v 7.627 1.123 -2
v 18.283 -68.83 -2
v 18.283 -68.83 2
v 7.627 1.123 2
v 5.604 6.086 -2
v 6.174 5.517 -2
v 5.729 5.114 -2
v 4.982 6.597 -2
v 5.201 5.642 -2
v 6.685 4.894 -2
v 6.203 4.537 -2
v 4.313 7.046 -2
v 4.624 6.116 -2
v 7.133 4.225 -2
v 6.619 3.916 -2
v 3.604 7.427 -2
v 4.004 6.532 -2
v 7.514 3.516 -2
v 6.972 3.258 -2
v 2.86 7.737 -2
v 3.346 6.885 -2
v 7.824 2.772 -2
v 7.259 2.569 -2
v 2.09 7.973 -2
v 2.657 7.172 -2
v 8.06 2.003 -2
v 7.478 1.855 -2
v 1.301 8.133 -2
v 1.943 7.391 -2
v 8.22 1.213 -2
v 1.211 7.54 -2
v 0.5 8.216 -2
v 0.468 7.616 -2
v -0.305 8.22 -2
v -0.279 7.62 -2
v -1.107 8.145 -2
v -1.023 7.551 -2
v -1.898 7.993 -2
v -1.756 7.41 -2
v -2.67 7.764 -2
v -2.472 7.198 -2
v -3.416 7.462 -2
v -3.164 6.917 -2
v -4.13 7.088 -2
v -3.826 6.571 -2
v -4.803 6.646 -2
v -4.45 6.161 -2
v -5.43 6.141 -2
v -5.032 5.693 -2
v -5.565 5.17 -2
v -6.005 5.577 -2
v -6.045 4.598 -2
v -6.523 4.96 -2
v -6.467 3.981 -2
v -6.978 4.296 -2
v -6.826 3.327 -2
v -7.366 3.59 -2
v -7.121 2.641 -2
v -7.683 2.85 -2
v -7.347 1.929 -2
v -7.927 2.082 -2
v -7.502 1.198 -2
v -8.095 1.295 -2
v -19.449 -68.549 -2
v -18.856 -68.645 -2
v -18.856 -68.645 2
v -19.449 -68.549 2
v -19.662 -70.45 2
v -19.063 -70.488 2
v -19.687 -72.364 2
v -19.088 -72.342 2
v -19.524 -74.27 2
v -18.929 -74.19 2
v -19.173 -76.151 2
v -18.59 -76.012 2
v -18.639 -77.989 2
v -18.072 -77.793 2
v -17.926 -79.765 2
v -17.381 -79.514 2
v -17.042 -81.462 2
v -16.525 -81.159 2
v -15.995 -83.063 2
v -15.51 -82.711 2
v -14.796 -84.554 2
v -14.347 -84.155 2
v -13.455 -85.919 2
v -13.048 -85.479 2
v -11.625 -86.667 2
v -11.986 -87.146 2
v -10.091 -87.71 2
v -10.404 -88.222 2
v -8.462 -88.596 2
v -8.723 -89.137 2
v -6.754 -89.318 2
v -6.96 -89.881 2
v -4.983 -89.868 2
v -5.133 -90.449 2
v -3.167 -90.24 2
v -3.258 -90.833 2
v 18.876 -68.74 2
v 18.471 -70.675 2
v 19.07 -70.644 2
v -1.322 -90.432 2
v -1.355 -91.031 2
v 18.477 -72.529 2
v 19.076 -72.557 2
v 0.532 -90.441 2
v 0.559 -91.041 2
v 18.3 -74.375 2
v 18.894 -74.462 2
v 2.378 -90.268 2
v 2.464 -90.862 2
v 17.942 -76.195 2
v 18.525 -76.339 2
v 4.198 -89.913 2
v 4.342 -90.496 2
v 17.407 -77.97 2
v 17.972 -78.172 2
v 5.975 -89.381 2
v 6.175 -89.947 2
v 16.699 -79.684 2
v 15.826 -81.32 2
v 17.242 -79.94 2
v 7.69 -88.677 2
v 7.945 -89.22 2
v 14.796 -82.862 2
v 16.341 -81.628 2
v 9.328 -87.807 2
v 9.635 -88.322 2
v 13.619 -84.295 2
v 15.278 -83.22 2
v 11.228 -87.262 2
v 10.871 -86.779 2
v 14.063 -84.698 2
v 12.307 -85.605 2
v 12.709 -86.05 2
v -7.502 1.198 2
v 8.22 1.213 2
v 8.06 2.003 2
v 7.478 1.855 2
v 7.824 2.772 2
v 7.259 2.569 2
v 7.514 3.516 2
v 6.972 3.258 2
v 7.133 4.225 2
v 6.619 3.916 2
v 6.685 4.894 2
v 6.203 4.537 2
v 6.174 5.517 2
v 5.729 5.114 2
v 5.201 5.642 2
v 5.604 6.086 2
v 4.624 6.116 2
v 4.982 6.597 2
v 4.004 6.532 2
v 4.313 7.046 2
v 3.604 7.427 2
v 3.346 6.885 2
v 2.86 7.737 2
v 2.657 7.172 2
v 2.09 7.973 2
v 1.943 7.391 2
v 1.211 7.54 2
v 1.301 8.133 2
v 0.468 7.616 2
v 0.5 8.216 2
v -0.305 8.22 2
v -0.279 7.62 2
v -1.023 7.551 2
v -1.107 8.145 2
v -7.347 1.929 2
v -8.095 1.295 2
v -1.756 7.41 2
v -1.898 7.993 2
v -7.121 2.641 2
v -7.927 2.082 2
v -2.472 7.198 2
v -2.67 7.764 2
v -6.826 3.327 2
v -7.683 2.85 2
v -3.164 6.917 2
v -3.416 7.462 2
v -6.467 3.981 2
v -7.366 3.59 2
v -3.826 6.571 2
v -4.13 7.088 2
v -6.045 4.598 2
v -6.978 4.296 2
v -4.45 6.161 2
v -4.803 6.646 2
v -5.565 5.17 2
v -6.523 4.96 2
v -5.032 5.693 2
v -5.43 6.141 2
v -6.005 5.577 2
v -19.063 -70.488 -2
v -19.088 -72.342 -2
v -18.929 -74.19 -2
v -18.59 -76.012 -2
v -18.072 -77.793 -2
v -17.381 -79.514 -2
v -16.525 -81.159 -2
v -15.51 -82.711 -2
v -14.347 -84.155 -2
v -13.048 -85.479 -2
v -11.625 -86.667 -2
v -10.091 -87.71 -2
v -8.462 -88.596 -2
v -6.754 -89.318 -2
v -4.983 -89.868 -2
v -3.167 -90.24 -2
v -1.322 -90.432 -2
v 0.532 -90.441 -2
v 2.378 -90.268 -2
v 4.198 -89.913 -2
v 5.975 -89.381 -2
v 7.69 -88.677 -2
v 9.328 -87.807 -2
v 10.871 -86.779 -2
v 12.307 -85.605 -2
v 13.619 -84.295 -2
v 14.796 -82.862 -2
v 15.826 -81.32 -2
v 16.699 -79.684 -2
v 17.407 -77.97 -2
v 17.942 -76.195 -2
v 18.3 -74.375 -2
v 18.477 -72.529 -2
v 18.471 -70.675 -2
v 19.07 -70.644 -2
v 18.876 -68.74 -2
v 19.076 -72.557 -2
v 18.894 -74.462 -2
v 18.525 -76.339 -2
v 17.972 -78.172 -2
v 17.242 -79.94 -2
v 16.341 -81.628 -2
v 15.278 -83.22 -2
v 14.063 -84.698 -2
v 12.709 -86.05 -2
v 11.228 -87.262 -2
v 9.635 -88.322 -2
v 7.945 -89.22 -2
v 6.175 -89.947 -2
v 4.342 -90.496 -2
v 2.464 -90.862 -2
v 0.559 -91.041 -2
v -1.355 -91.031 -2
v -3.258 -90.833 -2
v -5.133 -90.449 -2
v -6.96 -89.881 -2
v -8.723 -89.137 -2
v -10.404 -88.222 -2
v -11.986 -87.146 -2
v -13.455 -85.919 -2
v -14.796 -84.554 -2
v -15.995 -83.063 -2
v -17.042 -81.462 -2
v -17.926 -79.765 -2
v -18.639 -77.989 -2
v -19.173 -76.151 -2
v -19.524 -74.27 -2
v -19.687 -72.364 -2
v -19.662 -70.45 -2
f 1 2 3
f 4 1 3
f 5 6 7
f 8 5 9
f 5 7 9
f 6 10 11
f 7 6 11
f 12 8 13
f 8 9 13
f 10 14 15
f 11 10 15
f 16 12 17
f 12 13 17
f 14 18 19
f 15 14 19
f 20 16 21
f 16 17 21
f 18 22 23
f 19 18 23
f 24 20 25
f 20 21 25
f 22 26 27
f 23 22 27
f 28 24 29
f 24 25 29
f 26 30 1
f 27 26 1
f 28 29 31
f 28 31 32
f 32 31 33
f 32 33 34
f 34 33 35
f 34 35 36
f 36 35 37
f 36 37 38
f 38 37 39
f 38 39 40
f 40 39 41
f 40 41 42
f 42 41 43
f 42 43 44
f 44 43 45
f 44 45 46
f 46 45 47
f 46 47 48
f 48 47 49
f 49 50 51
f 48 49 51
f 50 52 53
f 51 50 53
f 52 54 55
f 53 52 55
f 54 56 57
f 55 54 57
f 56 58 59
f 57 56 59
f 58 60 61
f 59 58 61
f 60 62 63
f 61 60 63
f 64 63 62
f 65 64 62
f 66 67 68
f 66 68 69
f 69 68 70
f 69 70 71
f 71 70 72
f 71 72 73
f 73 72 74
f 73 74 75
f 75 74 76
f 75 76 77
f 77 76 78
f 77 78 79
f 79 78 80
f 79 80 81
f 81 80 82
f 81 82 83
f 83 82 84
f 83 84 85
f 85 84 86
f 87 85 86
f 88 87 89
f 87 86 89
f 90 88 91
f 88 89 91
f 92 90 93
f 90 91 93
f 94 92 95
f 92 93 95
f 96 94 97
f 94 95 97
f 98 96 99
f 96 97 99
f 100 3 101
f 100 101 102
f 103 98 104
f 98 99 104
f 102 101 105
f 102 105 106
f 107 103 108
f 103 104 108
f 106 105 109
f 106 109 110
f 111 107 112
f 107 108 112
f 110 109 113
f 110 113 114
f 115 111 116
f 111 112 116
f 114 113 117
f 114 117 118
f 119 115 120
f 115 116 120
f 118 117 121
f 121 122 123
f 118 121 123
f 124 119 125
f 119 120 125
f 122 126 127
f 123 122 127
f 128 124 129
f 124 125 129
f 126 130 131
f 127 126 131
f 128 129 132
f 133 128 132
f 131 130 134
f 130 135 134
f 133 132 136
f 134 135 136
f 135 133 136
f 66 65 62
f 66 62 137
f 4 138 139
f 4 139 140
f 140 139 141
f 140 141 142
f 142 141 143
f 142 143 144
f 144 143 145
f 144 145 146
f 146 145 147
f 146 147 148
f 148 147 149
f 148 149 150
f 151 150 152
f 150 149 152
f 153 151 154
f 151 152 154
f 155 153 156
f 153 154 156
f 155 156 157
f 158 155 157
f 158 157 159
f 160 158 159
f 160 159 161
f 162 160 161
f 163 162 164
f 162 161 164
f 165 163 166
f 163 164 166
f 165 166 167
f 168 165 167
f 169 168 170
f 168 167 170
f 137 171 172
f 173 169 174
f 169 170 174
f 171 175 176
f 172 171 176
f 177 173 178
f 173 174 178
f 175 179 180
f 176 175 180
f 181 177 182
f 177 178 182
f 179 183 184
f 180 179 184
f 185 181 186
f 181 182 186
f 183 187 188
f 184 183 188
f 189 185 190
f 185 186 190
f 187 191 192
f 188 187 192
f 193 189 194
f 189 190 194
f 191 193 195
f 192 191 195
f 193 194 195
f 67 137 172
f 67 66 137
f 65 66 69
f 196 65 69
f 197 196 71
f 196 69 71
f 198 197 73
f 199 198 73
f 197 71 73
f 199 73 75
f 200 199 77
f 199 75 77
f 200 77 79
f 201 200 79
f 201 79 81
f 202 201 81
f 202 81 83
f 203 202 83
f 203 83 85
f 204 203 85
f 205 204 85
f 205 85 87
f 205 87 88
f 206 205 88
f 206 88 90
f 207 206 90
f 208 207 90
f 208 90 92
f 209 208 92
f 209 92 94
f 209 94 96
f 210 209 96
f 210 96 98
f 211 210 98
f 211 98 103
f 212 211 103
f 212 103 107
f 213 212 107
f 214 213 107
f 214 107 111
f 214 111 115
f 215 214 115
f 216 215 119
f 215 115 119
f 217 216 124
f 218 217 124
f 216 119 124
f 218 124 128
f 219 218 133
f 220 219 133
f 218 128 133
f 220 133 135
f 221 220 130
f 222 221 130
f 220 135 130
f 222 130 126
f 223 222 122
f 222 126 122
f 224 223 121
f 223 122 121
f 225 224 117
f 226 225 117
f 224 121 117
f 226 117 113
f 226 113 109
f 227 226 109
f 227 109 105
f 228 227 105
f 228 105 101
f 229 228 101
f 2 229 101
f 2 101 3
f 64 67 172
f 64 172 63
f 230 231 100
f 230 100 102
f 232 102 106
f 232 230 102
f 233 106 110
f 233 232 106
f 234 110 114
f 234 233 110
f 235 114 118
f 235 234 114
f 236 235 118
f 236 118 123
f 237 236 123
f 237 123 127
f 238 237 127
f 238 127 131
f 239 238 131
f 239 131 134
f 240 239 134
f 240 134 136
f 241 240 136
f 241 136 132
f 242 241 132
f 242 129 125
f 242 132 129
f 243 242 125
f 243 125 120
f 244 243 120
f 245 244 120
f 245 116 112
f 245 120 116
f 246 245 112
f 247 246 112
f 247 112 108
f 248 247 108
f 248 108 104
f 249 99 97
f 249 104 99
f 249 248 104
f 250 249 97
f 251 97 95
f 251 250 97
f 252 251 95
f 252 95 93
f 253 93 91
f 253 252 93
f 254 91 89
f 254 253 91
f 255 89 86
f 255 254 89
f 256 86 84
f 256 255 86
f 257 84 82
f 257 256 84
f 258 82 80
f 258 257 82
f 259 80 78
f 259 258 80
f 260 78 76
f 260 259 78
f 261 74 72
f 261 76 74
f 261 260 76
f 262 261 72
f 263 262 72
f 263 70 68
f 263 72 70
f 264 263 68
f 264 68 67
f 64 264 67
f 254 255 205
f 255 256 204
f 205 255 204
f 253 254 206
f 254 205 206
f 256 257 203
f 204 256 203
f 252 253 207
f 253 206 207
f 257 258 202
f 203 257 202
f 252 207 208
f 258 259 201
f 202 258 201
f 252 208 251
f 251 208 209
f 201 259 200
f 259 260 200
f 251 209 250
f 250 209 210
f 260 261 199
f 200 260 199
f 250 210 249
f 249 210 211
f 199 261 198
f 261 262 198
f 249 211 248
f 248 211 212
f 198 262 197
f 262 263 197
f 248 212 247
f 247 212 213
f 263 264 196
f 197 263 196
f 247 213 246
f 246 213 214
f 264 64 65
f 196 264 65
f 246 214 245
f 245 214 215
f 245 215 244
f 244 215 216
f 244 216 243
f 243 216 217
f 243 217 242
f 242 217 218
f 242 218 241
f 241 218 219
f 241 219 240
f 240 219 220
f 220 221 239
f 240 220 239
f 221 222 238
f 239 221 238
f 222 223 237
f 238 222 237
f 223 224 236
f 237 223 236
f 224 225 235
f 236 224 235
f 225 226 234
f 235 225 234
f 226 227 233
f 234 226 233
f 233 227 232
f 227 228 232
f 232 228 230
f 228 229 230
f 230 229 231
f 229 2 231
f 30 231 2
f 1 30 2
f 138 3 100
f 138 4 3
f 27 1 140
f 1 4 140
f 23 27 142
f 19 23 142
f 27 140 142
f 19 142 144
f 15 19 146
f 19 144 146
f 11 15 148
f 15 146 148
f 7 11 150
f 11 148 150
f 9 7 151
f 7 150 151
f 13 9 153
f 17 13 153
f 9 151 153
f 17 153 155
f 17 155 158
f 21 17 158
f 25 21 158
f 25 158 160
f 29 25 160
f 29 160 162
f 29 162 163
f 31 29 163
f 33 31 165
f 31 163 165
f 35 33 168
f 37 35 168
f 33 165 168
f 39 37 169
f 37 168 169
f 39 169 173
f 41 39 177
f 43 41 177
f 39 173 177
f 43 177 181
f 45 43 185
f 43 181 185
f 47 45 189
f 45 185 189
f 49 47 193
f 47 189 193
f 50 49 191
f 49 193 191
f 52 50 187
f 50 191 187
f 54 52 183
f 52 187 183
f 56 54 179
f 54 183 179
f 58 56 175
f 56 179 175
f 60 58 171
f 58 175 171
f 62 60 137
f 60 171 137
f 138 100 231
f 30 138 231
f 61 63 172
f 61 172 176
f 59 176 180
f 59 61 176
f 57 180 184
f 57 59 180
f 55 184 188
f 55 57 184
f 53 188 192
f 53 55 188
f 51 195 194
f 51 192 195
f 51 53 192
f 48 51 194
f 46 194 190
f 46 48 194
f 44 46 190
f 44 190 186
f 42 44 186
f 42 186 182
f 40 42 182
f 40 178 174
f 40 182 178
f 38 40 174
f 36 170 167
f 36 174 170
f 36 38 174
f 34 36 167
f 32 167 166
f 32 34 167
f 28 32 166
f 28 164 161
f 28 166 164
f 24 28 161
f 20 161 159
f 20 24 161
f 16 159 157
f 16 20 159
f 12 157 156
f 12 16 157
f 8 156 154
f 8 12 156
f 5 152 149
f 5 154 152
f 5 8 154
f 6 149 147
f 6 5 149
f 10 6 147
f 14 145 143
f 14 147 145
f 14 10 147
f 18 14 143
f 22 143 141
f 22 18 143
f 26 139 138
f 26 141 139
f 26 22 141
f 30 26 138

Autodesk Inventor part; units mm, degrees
sketch "Sketch Path" plane through (0, 0, 0) normal (0, 0, 1) x (1, 0, 0)
  arc A0 (7.9232, 1.1681) -> (-7.7984, 1.2466) centre (0.0562, -0.0303) ccw
  arc A1 (-19.1526, -68.5968) -> (18.5793, -68.7851) centre (-0.3014, -71.6613) ccw
  line L0 (-19.1526, -68.5968) -> (-7.7984, 1.2466)
  line L1 (7.9232, 1.1681) -> (18.5793, -68.7851)
ref_plane "Cross Section Plane" through (-7.7984, 1.2466, 0) normal (-0.1605, -0.987, 0) x (0, 0, 1)
ref_plane "Work Plane2" through (0.0562, -0.0303, 0) normal (-1, 0, 0) x (0, 0, 1)
ref_plane "Work Plane3" through (-0.3014, -71.6613, 0) normal (-0.0029, -1, 0) x (0, 0, 1)
sketch "Cross Section" plane through (-7.7984, 1.2466, 0) normal (-0.1605, -0.987, 0) x (0, 0, 1)
  line L0 (-2, 0.3) -> (2, 0.3)
  line L1 (2, 0.3) -> (2, -0.3)
  line L2 (2, -0.3) -> (-2, -0.3)
  line L3 (-2, -0.3) -> (-2, 0.3)
  line L4 (-2, 0) -> (2, 0) construction
  point P0 (0, 0)
  point P1 (0, 0)
  dimension "d0" = 4
  dimension "d4" = 0.3
  dimension "d5" = 0.3
sweep "Belt" add profiles "Cross Section" path "Sketch Path"
equation "\"d0\" = da_B"
equation "\"d4\" = da_a"
equation "\"d5\" = da_a2"
equation "\"da_B\" = 4"
equation "\"da_pb\" = 2.5"
equation "\"da_a\" = 0.3"
equation "\"da_S\" = 1.5"
equation "\"da_Beta\" = 20deg"
equation "\"da_Ht\" = 0.7"
equation "\"da_H\" = 1.3"
equation "\"da_a2\" = 0.3"
properties part number "Synchronous Belt" material "Rubber"
